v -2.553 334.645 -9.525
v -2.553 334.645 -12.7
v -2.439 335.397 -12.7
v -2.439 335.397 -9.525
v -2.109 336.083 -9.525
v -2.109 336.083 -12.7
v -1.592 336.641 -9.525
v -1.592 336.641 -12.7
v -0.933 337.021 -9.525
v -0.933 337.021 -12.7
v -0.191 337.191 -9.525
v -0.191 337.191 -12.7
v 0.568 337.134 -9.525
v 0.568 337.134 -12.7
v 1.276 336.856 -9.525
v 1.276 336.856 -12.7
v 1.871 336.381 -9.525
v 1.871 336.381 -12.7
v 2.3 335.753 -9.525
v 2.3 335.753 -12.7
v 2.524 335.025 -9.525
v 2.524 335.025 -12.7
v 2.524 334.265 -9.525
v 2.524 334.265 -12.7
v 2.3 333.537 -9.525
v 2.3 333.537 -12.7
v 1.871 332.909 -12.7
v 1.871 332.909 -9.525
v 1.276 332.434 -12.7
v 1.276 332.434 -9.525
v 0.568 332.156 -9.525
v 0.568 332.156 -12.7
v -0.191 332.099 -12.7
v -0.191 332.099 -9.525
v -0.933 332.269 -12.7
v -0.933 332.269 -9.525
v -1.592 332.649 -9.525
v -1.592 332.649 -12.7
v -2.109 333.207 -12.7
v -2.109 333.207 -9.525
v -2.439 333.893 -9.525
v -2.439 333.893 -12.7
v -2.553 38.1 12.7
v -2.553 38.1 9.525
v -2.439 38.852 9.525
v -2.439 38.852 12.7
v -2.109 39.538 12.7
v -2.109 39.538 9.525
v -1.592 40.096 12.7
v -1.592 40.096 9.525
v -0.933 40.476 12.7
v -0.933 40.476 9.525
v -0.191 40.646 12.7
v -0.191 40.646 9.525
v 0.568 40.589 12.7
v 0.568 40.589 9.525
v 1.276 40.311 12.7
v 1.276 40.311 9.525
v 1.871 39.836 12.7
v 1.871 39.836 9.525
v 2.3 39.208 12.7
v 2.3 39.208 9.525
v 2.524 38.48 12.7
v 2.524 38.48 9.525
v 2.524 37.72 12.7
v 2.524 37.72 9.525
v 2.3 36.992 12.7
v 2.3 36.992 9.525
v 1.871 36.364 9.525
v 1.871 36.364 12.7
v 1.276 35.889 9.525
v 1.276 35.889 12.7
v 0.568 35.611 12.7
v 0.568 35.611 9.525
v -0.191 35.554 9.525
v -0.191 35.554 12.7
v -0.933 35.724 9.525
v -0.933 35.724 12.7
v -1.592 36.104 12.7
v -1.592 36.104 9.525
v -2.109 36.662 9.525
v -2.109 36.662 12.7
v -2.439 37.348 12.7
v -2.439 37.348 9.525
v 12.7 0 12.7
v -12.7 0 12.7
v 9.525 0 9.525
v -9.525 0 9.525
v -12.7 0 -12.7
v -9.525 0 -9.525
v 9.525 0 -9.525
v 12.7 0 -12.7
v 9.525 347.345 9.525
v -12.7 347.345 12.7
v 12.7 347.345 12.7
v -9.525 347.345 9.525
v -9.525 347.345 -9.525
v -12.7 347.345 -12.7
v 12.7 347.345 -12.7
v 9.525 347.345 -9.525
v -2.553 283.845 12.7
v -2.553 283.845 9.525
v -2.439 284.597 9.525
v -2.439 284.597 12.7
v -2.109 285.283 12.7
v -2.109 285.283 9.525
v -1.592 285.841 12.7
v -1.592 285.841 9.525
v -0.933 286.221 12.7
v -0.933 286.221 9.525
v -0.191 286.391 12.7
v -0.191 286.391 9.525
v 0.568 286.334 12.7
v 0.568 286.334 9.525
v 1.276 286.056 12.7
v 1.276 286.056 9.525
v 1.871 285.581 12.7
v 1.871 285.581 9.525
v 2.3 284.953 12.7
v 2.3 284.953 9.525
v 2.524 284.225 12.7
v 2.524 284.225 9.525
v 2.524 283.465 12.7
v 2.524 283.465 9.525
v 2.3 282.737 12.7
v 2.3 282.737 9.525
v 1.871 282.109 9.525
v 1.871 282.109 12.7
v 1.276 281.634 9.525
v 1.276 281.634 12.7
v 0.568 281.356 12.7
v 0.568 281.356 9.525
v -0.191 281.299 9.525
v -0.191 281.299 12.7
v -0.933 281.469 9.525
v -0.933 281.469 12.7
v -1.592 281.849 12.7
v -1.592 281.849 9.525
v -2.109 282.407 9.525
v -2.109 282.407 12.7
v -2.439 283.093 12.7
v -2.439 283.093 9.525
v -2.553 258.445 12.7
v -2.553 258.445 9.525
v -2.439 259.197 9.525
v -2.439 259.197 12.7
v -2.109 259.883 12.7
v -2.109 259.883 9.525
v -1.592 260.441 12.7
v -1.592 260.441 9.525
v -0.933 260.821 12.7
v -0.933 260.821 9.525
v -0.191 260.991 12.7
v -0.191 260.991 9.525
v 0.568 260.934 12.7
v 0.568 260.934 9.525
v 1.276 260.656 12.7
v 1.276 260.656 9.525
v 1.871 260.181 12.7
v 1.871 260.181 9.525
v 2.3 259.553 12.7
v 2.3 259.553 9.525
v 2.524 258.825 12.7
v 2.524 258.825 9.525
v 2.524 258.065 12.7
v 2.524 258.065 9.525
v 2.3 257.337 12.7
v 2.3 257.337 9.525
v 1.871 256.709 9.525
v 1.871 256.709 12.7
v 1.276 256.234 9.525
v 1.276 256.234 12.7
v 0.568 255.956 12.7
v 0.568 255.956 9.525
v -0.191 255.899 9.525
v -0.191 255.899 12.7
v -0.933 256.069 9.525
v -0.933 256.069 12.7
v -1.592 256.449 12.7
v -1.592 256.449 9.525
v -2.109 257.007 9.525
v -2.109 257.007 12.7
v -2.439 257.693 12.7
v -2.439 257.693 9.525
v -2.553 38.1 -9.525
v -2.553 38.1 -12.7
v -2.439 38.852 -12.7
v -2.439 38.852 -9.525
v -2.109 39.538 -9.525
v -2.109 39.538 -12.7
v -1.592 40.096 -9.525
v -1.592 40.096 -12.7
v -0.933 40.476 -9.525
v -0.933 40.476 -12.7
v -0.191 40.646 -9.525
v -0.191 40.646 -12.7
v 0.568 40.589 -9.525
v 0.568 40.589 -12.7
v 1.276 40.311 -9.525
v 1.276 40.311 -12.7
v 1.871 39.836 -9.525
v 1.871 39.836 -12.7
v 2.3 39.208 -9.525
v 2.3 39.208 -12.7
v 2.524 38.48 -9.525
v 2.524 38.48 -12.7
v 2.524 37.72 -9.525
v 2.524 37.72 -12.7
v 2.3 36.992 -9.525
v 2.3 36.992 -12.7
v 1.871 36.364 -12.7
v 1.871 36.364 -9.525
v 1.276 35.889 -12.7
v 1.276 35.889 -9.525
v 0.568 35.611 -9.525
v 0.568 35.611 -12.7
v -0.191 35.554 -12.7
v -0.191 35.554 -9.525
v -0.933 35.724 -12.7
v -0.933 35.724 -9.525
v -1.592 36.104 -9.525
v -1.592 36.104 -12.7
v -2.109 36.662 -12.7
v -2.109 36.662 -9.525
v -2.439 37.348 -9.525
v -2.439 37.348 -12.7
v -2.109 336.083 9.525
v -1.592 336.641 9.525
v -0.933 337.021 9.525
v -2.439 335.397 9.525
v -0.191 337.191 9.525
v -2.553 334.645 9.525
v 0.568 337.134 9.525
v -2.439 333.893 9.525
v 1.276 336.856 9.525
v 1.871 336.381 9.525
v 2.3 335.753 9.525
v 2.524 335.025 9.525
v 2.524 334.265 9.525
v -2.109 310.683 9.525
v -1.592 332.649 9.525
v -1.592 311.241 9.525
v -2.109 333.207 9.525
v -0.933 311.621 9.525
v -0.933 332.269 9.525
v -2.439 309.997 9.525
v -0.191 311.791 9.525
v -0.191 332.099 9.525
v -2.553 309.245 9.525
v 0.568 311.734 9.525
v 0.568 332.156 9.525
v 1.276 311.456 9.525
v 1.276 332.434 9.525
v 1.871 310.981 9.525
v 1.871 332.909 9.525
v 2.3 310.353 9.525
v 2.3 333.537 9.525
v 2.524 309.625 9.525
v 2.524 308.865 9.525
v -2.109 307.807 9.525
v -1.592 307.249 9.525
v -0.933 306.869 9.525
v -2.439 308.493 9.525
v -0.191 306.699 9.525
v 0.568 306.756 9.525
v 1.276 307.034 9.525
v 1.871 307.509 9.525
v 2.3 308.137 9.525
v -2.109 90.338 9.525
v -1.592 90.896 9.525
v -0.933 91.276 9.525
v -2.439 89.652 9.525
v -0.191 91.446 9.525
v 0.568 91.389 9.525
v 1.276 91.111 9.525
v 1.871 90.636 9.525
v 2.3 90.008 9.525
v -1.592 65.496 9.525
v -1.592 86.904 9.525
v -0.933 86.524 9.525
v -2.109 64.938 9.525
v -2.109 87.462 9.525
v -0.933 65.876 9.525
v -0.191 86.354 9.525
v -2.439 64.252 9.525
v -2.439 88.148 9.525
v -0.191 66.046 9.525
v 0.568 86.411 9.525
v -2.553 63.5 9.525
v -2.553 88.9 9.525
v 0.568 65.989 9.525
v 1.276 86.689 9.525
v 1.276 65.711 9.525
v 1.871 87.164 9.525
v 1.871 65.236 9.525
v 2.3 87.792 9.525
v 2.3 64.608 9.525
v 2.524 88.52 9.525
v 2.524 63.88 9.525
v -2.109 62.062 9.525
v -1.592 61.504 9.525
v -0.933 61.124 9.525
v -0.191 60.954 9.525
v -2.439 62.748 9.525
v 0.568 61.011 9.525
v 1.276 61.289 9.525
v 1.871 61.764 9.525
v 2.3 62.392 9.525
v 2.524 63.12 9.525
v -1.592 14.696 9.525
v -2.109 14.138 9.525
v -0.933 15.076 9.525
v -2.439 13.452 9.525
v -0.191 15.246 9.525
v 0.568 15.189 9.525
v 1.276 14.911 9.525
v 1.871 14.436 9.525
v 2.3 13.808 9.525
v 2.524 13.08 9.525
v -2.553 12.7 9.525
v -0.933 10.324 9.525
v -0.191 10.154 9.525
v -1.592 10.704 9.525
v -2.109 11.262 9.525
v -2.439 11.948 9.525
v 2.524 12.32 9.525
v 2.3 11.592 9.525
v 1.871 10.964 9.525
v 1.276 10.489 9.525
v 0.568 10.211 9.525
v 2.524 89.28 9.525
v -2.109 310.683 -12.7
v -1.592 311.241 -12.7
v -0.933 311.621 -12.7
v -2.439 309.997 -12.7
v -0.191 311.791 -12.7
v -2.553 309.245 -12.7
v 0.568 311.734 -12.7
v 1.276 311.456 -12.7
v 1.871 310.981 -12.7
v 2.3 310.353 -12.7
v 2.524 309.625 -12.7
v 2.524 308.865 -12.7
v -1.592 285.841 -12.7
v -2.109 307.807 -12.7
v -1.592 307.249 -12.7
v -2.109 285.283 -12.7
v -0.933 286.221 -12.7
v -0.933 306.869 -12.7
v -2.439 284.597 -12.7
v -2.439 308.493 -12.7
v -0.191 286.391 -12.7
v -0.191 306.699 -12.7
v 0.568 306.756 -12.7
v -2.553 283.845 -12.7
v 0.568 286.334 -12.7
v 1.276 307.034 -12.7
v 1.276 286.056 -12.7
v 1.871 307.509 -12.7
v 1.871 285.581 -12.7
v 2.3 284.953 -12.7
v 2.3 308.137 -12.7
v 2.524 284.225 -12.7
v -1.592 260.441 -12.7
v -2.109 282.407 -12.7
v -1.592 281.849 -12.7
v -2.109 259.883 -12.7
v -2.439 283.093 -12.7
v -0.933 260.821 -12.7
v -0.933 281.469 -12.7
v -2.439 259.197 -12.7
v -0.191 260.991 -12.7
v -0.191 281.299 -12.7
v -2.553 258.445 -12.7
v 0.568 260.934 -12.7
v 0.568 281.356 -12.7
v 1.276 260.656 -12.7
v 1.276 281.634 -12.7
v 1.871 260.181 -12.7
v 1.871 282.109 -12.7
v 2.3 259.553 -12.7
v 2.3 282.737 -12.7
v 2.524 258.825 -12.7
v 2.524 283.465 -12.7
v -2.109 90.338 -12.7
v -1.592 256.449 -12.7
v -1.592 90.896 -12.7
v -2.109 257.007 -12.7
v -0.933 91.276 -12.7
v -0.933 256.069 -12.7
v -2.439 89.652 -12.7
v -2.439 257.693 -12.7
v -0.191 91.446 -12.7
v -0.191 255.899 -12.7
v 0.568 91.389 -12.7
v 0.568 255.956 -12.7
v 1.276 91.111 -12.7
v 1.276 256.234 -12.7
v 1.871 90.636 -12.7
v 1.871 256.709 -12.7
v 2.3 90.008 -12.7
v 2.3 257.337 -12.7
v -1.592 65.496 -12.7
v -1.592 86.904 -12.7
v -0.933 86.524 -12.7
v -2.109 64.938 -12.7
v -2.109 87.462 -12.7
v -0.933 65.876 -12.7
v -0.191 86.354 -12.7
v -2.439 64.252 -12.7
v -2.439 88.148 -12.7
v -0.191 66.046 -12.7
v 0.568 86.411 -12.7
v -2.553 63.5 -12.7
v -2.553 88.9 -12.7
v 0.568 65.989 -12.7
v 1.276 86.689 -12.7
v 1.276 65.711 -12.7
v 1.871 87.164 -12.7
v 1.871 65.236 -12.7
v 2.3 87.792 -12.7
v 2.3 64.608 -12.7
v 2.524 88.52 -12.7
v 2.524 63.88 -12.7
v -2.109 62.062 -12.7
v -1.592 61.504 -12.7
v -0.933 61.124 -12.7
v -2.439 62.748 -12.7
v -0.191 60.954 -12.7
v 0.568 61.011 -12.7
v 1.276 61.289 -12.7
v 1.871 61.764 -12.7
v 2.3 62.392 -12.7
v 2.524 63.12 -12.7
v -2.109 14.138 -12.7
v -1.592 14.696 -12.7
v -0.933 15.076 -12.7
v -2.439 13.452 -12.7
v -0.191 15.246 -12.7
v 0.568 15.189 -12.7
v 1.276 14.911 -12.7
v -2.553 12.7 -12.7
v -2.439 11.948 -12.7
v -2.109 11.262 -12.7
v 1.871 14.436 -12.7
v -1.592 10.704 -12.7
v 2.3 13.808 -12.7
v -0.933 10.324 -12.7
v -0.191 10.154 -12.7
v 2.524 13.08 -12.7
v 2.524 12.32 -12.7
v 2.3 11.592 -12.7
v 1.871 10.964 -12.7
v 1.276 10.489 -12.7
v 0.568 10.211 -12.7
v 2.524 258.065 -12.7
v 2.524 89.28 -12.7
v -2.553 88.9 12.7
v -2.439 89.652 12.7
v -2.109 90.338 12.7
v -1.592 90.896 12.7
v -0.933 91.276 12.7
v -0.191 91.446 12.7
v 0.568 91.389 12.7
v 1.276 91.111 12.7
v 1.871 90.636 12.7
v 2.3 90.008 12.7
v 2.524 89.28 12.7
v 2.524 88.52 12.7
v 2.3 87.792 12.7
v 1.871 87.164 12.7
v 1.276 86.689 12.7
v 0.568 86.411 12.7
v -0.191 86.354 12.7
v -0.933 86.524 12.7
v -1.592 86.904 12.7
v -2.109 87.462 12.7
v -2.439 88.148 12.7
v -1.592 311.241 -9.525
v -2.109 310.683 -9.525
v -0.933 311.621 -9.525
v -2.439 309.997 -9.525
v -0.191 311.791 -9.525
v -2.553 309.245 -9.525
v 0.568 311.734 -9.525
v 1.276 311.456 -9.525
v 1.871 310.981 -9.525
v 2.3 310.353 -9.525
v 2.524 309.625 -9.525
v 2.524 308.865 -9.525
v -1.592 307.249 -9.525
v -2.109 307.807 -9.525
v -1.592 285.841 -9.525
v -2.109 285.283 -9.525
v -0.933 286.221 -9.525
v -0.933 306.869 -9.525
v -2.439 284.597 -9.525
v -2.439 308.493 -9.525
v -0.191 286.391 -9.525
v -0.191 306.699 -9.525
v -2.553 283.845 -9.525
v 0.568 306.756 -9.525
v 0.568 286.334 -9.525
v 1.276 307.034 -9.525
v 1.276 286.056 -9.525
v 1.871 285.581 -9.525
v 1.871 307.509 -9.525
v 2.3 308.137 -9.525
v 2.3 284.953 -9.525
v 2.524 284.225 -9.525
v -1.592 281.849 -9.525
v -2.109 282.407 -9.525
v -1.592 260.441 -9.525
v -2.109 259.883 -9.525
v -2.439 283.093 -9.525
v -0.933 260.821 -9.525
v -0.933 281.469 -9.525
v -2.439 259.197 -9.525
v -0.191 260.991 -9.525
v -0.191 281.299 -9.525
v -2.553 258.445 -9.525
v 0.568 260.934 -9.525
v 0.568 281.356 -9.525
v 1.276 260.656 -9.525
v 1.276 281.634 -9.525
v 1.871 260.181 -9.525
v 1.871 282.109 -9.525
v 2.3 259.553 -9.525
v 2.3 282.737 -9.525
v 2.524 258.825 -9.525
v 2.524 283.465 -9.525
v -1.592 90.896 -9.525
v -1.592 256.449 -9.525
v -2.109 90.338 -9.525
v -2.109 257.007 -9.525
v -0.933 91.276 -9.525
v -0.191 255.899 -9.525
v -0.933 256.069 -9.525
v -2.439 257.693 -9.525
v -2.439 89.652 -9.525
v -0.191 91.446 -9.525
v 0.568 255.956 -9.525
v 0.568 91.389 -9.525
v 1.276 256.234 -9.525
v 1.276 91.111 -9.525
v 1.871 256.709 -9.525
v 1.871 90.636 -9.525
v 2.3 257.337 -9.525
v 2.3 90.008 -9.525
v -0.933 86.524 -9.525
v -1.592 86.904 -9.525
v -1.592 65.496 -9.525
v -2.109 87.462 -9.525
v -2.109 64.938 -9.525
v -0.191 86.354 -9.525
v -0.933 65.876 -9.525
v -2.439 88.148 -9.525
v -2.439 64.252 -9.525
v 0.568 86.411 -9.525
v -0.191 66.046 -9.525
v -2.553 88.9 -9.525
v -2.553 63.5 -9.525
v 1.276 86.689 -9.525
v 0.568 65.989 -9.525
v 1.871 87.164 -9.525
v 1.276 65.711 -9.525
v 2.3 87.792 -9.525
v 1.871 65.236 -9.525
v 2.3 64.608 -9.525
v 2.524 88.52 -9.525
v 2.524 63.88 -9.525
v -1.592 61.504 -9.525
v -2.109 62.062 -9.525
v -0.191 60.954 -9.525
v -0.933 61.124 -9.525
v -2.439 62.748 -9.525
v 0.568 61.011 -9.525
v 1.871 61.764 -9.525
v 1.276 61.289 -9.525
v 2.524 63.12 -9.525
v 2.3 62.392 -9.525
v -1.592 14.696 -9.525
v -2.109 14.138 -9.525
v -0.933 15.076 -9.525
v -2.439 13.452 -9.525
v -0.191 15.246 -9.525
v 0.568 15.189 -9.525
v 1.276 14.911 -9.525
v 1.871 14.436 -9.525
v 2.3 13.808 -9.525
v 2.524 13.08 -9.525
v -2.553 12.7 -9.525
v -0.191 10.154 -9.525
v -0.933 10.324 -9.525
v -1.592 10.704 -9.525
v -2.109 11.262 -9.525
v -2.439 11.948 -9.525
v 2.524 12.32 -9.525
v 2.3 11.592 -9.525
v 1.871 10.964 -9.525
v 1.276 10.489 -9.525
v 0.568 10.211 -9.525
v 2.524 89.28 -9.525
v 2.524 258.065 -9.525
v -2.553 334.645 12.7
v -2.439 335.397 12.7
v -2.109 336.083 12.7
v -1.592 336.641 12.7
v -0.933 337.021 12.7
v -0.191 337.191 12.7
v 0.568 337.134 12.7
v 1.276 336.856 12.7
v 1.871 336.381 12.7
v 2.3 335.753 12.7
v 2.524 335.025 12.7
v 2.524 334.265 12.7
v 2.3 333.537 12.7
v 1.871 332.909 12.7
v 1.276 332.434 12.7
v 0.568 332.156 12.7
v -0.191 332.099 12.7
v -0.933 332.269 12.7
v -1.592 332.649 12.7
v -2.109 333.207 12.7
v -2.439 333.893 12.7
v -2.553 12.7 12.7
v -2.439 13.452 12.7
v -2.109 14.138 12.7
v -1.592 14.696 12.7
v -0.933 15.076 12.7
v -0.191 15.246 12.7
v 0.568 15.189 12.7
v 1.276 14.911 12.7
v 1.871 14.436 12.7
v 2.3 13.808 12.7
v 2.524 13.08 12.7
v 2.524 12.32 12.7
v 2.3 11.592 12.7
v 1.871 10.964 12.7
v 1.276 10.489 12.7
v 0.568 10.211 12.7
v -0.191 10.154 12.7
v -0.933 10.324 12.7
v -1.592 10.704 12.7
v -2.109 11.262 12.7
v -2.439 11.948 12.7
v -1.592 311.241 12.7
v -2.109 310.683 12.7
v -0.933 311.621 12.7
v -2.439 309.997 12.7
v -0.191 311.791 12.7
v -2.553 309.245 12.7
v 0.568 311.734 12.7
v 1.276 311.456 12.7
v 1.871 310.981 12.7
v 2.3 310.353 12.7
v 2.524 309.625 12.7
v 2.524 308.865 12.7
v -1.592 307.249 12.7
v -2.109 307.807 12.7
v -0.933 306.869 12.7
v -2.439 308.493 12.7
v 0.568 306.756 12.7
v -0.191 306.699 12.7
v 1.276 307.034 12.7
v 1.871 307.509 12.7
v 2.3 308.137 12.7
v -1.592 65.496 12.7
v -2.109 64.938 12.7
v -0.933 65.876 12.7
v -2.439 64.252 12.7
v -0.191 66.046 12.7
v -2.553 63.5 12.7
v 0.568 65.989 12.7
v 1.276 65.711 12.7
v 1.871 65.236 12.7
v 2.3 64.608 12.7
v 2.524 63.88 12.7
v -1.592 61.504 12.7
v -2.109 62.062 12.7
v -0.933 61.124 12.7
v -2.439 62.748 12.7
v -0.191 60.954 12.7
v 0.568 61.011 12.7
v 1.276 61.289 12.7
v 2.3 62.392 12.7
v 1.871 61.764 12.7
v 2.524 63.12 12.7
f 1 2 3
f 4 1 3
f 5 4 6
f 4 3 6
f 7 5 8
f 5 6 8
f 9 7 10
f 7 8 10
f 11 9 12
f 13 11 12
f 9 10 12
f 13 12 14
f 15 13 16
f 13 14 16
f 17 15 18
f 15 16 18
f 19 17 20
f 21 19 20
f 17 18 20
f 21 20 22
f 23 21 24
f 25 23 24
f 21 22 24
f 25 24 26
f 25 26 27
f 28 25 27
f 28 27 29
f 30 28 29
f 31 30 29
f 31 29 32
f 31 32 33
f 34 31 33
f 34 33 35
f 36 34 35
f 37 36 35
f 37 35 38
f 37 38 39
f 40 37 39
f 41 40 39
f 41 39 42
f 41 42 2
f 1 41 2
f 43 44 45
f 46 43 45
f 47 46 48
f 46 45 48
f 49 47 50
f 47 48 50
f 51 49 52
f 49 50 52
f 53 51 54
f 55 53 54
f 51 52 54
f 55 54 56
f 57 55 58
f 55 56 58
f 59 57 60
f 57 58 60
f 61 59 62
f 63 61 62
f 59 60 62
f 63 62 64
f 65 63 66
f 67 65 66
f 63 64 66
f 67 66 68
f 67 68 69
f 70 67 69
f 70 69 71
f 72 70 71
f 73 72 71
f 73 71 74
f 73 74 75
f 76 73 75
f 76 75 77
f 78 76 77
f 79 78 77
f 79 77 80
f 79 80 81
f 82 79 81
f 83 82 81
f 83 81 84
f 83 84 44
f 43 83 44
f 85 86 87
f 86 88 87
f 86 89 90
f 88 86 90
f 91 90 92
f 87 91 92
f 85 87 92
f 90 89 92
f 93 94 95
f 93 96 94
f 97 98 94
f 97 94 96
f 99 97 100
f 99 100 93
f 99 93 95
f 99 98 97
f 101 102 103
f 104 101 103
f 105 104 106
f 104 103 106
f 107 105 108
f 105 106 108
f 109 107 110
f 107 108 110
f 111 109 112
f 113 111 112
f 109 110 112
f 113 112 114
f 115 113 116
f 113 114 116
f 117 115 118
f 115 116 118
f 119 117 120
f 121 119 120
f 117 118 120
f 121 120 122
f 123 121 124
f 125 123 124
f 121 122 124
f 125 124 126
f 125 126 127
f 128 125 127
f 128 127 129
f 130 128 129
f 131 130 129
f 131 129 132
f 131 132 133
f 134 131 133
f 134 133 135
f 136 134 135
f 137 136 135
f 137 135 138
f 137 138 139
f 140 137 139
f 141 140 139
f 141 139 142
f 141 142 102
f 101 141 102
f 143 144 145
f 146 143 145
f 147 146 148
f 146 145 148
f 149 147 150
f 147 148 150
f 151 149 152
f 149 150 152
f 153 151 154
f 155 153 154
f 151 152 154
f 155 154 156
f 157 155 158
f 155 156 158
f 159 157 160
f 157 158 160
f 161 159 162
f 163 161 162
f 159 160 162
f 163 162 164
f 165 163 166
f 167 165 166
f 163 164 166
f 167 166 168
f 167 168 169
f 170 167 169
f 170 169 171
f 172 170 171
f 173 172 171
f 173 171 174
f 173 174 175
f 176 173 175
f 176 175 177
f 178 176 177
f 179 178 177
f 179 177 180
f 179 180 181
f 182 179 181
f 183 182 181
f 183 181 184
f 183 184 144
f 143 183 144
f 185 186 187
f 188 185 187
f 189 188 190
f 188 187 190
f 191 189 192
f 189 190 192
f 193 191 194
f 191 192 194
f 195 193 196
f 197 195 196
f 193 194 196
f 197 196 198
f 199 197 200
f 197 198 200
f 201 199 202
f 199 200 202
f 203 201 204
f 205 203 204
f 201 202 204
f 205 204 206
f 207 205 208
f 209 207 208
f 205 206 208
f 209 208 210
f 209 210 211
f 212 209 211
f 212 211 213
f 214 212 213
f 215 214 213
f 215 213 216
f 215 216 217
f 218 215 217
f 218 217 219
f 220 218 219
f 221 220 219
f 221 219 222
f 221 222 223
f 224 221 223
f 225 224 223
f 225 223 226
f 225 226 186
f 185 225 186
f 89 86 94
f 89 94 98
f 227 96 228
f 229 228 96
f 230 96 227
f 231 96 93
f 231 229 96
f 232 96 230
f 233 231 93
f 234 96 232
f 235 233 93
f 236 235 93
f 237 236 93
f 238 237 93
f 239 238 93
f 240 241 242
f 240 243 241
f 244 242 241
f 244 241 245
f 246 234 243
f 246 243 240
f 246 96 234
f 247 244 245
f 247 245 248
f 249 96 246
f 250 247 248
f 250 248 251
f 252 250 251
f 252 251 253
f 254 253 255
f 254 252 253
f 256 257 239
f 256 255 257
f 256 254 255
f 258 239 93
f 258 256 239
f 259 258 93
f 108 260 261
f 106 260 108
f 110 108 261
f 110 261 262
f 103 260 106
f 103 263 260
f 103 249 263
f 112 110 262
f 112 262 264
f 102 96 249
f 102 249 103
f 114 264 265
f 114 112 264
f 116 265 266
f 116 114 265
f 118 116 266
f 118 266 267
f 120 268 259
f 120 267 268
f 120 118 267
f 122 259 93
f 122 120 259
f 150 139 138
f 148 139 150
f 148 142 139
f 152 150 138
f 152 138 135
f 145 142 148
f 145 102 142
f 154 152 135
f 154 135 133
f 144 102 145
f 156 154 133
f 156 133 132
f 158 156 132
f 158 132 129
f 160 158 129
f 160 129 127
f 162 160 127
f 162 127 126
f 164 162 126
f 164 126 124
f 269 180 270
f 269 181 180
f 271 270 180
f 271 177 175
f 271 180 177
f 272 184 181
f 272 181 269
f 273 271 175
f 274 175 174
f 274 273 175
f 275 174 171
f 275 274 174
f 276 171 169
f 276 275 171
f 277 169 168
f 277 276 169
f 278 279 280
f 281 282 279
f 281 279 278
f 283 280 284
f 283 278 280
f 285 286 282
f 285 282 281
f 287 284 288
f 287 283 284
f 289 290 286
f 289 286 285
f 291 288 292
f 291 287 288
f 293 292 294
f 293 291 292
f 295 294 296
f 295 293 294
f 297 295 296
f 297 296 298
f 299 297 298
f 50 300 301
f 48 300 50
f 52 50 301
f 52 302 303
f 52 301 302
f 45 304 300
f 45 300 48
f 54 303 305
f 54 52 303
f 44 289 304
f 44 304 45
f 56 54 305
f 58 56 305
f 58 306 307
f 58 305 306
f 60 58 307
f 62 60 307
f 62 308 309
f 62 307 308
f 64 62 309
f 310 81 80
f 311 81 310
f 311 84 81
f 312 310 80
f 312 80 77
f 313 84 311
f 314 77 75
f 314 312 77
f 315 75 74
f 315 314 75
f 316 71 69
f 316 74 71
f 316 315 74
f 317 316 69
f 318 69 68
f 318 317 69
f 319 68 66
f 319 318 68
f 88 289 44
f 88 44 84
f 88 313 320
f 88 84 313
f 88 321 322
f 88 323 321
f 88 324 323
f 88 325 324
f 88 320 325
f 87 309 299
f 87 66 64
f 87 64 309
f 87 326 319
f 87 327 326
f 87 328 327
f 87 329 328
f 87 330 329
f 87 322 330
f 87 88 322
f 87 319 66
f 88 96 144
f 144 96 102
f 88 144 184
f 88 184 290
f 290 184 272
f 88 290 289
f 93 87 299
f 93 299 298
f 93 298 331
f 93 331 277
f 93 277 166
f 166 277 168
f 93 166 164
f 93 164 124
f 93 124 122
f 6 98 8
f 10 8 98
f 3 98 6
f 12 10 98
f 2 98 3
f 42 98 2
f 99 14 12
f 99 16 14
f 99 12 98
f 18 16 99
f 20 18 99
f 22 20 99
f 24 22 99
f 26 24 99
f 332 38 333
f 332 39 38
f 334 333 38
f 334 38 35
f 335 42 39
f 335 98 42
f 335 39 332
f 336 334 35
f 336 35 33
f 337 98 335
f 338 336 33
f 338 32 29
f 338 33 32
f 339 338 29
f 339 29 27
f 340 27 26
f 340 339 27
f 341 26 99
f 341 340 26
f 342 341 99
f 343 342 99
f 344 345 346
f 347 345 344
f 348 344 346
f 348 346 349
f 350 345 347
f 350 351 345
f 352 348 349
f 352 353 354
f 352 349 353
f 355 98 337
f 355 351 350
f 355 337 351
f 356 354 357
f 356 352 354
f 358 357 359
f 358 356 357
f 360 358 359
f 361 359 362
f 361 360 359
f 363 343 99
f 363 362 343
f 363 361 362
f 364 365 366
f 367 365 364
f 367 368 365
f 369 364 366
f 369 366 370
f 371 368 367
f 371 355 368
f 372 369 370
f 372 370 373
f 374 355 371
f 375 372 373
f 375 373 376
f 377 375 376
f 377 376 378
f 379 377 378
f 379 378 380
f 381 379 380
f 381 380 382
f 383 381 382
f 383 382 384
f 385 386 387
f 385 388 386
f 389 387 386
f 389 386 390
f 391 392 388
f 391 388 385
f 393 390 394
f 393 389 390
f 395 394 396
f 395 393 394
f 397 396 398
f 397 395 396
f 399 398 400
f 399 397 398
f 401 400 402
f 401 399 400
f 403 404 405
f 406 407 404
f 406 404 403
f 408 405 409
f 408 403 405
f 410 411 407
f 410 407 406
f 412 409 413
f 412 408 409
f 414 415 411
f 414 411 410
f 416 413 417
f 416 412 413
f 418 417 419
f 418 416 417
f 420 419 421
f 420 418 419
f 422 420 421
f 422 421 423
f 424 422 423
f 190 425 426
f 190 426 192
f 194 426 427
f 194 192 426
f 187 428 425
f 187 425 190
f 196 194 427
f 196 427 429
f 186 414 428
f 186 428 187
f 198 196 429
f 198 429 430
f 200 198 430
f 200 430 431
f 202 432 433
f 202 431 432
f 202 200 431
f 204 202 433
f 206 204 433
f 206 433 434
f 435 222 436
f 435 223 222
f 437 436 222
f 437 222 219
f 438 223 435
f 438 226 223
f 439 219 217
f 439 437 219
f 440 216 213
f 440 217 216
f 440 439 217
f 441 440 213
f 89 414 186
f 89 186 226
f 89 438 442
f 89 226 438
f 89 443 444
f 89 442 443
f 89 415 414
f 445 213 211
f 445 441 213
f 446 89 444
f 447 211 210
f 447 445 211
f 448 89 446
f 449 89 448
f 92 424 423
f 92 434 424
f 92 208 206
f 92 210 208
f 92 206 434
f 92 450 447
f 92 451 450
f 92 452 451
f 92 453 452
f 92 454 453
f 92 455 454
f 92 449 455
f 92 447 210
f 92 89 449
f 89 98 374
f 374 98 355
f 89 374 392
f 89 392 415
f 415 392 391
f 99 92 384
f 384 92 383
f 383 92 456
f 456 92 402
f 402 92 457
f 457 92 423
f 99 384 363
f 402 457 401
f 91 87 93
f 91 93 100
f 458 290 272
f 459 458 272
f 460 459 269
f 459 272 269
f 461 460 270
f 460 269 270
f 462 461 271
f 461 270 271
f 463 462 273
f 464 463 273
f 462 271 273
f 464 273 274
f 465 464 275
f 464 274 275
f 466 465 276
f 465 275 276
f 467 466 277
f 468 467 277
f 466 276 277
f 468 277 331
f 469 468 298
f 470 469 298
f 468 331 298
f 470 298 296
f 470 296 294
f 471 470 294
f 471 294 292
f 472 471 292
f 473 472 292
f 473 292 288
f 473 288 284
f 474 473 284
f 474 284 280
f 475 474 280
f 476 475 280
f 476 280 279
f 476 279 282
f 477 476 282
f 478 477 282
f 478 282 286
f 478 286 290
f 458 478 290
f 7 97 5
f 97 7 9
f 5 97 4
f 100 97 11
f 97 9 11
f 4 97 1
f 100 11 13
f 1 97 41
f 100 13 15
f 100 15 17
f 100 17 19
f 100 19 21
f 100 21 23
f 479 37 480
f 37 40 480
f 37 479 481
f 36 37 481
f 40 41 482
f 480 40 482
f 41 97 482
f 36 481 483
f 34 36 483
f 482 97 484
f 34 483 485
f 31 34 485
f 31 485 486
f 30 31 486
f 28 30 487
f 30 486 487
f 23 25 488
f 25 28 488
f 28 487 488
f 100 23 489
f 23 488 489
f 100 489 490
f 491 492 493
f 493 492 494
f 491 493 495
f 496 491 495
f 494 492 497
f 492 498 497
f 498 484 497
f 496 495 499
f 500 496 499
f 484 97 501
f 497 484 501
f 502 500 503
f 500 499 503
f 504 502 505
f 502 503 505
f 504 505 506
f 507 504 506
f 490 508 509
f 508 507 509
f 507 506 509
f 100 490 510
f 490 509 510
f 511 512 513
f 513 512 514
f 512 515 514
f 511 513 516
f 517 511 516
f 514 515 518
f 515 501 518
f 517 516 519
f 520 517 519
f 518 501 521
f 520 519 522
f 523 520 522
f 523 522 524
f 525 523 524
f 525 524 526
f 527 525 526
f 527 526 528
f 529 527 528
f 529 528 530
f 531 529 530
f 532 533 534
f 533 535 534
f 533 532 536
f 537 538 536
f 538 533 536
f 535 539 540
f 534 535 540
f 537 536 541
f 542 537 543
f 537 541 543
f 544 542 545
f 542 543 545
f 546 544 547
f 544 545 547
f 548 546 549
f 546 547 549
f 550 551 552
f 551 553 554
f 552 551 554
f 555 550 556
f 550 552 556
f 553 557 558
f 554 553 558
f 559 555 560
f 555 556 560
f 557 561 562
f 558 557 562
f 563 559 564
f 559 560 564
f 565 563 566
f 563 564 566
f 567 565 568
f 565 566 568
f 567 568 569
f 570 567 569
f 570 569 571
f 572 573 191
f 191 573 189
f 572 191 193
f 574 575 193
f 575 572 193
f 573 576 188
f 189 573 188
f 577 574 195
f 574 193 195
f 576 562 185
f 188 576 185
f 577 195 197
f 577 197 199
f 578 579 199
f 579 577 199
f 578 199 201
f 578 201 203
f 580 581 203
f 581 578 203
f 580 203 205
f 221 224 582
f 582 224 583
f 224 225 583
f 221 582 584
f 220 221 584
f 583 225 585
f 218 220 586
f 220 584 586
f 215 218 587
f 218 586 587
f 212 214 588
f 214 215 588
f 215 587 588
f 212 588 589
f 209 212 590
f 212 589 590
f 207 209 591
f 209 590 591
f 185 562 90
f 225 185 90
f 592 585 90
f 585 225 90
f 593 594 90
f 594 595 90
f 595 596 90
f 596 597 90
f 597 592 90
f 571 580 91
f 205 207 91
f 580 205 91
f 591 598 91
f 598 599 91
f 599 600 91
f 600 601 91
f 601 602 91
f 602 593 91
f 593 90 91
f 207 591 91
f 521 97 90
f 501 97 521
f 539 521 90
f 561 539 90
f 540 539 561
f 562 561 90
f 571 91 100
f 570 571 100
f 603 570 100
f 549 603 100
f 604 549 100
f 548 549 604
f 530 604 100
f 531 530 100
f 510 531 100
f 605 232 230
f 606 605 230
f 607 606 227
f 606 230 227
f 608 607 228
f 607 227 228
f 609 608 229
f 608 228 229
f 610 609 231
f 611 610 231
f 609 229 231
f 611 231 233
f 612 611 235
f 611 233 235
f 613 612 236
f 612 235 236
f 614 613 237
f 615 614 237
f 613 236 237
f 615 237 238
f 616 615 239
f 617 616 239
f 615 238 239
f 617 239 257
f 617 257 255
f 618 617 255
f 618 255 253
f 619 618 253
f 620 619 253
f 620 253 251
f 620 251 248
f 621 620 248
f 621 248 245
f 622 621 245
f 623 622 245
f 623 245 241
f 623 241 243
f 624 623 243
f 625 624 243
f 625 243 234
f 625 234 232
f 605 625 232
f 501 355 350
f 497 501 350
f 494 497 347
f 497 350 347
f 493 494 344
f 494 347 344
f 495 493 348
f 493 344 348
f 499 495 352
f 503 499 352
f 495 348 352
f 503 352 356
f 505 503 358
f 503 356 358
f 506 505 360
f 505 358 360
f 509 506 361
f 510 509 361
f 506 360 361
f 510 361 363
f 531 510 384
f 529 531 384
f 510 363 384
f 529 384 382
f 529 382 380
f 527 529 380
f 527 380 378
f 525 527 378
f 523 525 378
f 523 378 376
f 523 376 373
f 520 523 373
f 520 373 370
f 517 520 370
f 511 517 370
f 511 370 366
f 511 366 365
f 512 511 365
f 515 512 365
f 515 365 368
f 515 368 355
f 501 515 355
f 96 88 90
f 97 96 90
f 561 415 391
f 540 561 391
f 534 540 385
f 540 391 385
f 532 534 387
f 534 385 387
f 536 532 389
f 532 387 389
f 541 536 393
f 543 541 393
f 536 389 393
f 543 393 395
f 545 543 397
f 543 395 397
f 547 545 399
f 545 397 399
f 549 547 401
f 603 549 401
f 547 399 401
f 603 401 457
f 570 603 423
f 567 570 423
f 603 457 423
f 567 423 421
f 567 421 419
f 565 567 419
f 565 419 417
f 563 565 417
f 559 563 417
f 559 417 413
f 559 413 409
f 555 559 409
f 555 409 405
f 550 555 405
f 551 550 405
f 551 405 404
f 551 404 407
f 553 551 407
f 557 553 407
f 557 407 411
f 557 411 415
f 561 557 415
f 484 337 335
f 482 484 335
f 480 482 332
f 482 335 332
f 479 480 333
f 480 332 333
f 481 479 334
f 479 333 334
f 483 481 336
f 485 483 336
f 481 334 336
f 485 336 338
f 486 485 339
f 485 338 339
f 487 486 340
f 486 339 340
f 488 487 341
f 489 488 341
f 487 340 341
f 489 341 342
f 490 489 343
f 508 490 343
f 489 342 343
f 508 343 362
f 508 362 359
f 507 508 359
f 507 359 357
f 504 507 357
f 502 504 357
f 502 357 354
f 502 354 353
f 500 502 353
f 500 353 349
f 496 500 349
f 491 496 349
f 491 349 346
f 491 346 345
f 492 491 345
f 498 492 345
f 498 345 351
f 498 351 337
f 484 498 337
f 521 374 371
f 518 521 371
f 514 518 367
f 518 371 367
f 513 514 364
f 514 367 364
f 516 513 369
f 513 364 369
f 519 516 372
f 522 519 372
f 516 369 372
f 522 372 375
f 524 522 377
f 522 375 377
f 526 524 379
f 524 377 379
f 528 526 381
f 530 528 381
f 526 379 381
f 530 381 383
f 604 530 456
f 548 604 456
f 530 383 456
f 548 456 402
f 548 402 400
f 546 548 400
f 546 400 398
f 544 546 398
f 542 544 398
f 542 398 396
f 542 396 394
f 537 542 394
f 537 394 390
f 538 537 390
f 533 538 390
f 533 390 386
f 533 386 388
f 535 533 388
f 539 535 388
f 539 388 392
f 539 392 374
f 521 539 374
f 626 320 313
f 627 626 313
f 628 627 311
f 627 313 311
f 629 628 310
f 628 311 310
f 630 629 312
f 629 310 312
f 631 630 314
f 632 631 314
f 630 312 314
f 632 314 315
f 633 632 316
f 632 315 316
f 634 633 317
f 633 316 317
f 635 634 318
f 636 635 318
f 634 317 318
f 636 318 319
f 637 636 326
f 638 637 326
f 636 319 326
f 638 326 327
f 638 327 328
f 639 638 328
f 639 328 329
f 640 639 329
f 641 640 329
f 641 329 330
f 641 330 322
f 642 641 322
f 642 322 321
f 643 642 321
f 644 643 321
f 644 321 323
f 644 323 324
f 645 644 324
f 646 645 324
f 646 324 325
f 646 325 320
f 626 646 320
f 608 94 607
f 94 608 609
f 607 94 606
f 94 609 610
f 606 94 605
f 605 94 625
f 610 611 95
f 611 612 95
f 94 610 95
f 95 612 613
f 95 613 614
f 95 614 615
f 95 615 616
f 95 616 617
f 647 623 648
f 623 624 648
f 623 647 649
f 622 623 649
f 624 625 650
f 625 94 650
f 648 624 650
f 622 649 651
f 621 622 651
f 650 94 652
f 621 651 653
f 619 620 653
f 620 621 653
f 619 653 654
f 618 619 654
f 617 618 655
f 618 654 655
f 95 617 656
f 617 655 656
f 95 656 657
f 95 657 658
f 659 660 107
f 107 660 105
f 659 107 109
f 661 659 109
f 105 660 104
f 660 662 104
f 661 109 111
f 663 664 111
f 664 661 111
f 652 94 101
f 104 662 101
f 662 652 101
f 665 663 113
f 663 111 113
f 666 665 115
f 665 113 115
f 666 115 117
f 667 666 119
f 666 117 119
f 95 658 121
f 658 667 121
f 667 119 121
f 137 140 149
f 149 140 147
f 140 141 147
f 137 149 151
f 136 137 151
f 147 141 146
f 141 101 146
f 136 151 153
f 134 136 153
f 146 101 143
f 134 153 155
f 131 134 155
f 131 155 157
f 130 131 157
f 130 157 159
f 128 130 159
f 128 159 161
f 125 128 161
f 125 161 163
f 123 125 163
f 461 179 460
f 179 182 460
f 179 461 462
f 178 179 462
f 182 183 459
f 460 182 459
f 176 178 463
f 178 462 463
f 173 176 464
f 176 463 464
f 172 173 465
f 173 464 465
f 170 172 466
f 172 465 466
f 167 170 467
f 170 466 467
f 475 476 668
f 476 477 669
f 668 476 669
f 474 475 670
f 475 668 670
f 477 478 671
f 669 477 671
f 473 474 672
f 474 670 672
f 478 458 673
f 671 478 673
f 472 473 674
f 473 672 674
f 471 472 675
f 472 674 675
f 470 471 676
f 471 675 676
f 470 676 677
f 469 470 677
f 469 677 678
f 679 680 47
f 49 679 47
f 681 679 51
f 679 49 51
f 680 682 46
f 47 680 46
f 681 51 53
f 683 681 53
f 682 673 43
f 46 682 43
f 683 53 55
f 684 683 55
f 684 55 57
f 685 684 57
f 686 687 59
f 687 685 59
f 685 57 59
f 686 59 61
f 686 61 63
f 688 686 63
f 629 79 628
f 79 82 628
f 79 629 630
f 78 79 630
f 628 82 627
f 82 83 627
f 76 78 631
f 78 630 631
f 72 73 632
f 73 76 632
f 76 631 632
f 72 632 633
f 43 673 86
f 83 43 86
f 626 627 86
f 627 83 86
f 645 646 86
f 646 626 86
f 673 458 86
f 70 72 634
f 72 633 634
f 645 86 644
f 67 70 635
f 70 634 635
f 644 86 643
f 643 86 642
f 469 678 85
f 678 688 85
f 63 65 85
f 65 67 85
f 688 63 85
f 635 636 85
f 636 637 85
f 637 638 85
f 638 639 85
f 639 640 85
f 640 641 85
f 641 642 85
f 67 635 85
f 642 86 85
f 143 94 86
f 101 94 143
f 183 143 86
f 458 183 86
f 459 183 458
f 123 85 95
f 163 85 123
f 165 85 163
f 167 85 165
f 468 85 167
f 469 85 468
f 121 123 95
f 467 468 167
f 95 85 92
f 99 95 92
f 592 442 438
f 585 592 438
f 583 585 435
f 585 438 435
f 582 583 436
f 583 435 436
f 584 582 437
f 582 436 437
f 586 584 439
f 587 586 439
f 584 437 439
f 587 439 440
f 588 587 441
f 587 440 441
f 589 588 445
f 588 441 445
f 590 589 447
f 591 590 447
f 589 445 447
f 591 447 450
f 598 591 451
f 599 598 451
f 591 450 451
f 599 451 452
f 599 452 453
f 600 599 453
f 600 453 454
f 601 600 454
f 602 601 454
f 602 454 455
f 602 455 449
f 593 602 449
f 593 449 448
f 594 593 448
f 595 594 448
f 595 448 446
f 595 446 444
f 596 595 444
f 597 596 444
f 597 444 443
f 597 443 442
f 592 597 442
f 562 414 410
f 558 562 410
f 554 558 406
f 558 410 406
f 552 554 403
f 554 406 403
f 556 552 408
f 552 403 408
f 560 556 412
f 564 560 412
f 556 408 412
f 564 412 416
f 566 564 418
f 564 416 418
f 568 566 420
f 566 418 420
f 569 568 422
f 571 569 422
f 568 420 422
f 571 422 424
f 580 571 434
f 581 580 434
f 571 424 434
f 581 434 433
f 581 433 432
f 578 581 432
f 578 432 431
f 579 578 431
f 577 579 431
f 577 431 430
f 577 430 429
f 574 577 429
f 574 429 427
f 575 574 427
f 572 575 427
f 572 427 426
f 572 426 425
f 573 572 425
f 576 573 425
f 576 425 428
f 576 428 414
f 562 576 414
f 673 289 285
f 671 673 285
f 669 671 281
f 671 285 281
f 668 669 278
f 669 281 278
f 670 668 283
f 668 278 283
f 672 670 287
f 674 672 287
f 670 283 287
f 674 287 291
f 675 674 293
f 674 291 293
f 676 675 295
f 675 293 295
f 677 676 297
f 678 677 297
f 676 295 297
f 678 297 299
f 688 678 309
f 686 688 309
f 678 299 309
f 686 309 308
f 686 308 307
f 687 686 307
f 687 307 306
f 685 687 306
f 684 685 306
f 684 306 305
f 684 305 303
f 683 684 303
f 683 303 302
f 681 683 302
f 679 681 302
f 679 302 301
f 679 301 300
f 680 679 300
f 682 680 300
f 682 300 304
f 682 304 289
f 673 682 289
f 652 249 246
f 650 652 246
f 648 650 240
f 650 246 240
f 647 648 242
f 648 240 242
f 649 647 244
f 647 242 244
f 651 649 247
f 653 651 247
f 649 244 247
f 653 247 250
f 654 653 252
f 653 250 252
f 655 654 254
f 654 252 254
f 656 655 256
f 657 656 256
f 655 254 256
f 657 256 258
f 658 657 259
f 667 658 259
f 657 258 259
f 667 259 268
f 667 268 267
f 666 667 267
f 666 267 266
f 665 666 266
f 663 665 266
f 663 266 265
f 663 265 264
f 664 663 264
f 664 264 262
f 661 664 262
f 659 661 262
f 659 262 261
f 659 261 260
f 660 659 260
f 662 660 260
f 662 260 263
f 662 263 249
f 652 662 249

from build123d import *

# Parameters (mm, degrees)
SKETCH1_W              = 25.4
SKETCH1_H              = 25.4
SKETCH1_W_2            = 19.05
SKETCH1_H_2            = 19.05
BOSS_EXTRUDE1_DEPTH    = 347.345
F_10_CLEARANCE_HOLE1_D = 5.1054
F_10_CLEARANCE_HOLE2_D = 5.1054


with BuildPart() as part:
    # Sketch1 → Boss-Extrude1 (new body)
    with BuildSketch(Plane(origin=(0, 0, 0), x_dir=(1, 0, 0), z_dir=(0, 1, 0))):
        Rectangle(SKETCH1_W, SKETCH1_H)
        Rectangle(SKETCH1_W_2, SKETCH1_H_2, mode=Mode.SUBTRACT)
    extrude(amount=BOSS_EXTRUDE1_DEPTH)

    # #10 Clearance Hole1 (through all)
    with Locations(Plane.XY.offset(12.7)):
        with Locations((0, 283.845), (0, 12.7), (0, 38.1), (0, 63.5), (0, 334.645), (0, 309.245)):
            Hole(F_10_CLEARANCE_HOLE1_D / 2)

    # #10 Clearance Hole2 (through all)
    with Locations(Plane(origin=(-1665.705302189, -475.547296868, 15.875), x_dir=(1, 0, 0), z_dir=(0, 0, 1))):
        with Locations((1665.705300516, 564.447296868), (1665.705300516, 733.992296868)):
            Hole(F_10_CLEARANCE_HOLE2_D / 2)


solid = part.part
